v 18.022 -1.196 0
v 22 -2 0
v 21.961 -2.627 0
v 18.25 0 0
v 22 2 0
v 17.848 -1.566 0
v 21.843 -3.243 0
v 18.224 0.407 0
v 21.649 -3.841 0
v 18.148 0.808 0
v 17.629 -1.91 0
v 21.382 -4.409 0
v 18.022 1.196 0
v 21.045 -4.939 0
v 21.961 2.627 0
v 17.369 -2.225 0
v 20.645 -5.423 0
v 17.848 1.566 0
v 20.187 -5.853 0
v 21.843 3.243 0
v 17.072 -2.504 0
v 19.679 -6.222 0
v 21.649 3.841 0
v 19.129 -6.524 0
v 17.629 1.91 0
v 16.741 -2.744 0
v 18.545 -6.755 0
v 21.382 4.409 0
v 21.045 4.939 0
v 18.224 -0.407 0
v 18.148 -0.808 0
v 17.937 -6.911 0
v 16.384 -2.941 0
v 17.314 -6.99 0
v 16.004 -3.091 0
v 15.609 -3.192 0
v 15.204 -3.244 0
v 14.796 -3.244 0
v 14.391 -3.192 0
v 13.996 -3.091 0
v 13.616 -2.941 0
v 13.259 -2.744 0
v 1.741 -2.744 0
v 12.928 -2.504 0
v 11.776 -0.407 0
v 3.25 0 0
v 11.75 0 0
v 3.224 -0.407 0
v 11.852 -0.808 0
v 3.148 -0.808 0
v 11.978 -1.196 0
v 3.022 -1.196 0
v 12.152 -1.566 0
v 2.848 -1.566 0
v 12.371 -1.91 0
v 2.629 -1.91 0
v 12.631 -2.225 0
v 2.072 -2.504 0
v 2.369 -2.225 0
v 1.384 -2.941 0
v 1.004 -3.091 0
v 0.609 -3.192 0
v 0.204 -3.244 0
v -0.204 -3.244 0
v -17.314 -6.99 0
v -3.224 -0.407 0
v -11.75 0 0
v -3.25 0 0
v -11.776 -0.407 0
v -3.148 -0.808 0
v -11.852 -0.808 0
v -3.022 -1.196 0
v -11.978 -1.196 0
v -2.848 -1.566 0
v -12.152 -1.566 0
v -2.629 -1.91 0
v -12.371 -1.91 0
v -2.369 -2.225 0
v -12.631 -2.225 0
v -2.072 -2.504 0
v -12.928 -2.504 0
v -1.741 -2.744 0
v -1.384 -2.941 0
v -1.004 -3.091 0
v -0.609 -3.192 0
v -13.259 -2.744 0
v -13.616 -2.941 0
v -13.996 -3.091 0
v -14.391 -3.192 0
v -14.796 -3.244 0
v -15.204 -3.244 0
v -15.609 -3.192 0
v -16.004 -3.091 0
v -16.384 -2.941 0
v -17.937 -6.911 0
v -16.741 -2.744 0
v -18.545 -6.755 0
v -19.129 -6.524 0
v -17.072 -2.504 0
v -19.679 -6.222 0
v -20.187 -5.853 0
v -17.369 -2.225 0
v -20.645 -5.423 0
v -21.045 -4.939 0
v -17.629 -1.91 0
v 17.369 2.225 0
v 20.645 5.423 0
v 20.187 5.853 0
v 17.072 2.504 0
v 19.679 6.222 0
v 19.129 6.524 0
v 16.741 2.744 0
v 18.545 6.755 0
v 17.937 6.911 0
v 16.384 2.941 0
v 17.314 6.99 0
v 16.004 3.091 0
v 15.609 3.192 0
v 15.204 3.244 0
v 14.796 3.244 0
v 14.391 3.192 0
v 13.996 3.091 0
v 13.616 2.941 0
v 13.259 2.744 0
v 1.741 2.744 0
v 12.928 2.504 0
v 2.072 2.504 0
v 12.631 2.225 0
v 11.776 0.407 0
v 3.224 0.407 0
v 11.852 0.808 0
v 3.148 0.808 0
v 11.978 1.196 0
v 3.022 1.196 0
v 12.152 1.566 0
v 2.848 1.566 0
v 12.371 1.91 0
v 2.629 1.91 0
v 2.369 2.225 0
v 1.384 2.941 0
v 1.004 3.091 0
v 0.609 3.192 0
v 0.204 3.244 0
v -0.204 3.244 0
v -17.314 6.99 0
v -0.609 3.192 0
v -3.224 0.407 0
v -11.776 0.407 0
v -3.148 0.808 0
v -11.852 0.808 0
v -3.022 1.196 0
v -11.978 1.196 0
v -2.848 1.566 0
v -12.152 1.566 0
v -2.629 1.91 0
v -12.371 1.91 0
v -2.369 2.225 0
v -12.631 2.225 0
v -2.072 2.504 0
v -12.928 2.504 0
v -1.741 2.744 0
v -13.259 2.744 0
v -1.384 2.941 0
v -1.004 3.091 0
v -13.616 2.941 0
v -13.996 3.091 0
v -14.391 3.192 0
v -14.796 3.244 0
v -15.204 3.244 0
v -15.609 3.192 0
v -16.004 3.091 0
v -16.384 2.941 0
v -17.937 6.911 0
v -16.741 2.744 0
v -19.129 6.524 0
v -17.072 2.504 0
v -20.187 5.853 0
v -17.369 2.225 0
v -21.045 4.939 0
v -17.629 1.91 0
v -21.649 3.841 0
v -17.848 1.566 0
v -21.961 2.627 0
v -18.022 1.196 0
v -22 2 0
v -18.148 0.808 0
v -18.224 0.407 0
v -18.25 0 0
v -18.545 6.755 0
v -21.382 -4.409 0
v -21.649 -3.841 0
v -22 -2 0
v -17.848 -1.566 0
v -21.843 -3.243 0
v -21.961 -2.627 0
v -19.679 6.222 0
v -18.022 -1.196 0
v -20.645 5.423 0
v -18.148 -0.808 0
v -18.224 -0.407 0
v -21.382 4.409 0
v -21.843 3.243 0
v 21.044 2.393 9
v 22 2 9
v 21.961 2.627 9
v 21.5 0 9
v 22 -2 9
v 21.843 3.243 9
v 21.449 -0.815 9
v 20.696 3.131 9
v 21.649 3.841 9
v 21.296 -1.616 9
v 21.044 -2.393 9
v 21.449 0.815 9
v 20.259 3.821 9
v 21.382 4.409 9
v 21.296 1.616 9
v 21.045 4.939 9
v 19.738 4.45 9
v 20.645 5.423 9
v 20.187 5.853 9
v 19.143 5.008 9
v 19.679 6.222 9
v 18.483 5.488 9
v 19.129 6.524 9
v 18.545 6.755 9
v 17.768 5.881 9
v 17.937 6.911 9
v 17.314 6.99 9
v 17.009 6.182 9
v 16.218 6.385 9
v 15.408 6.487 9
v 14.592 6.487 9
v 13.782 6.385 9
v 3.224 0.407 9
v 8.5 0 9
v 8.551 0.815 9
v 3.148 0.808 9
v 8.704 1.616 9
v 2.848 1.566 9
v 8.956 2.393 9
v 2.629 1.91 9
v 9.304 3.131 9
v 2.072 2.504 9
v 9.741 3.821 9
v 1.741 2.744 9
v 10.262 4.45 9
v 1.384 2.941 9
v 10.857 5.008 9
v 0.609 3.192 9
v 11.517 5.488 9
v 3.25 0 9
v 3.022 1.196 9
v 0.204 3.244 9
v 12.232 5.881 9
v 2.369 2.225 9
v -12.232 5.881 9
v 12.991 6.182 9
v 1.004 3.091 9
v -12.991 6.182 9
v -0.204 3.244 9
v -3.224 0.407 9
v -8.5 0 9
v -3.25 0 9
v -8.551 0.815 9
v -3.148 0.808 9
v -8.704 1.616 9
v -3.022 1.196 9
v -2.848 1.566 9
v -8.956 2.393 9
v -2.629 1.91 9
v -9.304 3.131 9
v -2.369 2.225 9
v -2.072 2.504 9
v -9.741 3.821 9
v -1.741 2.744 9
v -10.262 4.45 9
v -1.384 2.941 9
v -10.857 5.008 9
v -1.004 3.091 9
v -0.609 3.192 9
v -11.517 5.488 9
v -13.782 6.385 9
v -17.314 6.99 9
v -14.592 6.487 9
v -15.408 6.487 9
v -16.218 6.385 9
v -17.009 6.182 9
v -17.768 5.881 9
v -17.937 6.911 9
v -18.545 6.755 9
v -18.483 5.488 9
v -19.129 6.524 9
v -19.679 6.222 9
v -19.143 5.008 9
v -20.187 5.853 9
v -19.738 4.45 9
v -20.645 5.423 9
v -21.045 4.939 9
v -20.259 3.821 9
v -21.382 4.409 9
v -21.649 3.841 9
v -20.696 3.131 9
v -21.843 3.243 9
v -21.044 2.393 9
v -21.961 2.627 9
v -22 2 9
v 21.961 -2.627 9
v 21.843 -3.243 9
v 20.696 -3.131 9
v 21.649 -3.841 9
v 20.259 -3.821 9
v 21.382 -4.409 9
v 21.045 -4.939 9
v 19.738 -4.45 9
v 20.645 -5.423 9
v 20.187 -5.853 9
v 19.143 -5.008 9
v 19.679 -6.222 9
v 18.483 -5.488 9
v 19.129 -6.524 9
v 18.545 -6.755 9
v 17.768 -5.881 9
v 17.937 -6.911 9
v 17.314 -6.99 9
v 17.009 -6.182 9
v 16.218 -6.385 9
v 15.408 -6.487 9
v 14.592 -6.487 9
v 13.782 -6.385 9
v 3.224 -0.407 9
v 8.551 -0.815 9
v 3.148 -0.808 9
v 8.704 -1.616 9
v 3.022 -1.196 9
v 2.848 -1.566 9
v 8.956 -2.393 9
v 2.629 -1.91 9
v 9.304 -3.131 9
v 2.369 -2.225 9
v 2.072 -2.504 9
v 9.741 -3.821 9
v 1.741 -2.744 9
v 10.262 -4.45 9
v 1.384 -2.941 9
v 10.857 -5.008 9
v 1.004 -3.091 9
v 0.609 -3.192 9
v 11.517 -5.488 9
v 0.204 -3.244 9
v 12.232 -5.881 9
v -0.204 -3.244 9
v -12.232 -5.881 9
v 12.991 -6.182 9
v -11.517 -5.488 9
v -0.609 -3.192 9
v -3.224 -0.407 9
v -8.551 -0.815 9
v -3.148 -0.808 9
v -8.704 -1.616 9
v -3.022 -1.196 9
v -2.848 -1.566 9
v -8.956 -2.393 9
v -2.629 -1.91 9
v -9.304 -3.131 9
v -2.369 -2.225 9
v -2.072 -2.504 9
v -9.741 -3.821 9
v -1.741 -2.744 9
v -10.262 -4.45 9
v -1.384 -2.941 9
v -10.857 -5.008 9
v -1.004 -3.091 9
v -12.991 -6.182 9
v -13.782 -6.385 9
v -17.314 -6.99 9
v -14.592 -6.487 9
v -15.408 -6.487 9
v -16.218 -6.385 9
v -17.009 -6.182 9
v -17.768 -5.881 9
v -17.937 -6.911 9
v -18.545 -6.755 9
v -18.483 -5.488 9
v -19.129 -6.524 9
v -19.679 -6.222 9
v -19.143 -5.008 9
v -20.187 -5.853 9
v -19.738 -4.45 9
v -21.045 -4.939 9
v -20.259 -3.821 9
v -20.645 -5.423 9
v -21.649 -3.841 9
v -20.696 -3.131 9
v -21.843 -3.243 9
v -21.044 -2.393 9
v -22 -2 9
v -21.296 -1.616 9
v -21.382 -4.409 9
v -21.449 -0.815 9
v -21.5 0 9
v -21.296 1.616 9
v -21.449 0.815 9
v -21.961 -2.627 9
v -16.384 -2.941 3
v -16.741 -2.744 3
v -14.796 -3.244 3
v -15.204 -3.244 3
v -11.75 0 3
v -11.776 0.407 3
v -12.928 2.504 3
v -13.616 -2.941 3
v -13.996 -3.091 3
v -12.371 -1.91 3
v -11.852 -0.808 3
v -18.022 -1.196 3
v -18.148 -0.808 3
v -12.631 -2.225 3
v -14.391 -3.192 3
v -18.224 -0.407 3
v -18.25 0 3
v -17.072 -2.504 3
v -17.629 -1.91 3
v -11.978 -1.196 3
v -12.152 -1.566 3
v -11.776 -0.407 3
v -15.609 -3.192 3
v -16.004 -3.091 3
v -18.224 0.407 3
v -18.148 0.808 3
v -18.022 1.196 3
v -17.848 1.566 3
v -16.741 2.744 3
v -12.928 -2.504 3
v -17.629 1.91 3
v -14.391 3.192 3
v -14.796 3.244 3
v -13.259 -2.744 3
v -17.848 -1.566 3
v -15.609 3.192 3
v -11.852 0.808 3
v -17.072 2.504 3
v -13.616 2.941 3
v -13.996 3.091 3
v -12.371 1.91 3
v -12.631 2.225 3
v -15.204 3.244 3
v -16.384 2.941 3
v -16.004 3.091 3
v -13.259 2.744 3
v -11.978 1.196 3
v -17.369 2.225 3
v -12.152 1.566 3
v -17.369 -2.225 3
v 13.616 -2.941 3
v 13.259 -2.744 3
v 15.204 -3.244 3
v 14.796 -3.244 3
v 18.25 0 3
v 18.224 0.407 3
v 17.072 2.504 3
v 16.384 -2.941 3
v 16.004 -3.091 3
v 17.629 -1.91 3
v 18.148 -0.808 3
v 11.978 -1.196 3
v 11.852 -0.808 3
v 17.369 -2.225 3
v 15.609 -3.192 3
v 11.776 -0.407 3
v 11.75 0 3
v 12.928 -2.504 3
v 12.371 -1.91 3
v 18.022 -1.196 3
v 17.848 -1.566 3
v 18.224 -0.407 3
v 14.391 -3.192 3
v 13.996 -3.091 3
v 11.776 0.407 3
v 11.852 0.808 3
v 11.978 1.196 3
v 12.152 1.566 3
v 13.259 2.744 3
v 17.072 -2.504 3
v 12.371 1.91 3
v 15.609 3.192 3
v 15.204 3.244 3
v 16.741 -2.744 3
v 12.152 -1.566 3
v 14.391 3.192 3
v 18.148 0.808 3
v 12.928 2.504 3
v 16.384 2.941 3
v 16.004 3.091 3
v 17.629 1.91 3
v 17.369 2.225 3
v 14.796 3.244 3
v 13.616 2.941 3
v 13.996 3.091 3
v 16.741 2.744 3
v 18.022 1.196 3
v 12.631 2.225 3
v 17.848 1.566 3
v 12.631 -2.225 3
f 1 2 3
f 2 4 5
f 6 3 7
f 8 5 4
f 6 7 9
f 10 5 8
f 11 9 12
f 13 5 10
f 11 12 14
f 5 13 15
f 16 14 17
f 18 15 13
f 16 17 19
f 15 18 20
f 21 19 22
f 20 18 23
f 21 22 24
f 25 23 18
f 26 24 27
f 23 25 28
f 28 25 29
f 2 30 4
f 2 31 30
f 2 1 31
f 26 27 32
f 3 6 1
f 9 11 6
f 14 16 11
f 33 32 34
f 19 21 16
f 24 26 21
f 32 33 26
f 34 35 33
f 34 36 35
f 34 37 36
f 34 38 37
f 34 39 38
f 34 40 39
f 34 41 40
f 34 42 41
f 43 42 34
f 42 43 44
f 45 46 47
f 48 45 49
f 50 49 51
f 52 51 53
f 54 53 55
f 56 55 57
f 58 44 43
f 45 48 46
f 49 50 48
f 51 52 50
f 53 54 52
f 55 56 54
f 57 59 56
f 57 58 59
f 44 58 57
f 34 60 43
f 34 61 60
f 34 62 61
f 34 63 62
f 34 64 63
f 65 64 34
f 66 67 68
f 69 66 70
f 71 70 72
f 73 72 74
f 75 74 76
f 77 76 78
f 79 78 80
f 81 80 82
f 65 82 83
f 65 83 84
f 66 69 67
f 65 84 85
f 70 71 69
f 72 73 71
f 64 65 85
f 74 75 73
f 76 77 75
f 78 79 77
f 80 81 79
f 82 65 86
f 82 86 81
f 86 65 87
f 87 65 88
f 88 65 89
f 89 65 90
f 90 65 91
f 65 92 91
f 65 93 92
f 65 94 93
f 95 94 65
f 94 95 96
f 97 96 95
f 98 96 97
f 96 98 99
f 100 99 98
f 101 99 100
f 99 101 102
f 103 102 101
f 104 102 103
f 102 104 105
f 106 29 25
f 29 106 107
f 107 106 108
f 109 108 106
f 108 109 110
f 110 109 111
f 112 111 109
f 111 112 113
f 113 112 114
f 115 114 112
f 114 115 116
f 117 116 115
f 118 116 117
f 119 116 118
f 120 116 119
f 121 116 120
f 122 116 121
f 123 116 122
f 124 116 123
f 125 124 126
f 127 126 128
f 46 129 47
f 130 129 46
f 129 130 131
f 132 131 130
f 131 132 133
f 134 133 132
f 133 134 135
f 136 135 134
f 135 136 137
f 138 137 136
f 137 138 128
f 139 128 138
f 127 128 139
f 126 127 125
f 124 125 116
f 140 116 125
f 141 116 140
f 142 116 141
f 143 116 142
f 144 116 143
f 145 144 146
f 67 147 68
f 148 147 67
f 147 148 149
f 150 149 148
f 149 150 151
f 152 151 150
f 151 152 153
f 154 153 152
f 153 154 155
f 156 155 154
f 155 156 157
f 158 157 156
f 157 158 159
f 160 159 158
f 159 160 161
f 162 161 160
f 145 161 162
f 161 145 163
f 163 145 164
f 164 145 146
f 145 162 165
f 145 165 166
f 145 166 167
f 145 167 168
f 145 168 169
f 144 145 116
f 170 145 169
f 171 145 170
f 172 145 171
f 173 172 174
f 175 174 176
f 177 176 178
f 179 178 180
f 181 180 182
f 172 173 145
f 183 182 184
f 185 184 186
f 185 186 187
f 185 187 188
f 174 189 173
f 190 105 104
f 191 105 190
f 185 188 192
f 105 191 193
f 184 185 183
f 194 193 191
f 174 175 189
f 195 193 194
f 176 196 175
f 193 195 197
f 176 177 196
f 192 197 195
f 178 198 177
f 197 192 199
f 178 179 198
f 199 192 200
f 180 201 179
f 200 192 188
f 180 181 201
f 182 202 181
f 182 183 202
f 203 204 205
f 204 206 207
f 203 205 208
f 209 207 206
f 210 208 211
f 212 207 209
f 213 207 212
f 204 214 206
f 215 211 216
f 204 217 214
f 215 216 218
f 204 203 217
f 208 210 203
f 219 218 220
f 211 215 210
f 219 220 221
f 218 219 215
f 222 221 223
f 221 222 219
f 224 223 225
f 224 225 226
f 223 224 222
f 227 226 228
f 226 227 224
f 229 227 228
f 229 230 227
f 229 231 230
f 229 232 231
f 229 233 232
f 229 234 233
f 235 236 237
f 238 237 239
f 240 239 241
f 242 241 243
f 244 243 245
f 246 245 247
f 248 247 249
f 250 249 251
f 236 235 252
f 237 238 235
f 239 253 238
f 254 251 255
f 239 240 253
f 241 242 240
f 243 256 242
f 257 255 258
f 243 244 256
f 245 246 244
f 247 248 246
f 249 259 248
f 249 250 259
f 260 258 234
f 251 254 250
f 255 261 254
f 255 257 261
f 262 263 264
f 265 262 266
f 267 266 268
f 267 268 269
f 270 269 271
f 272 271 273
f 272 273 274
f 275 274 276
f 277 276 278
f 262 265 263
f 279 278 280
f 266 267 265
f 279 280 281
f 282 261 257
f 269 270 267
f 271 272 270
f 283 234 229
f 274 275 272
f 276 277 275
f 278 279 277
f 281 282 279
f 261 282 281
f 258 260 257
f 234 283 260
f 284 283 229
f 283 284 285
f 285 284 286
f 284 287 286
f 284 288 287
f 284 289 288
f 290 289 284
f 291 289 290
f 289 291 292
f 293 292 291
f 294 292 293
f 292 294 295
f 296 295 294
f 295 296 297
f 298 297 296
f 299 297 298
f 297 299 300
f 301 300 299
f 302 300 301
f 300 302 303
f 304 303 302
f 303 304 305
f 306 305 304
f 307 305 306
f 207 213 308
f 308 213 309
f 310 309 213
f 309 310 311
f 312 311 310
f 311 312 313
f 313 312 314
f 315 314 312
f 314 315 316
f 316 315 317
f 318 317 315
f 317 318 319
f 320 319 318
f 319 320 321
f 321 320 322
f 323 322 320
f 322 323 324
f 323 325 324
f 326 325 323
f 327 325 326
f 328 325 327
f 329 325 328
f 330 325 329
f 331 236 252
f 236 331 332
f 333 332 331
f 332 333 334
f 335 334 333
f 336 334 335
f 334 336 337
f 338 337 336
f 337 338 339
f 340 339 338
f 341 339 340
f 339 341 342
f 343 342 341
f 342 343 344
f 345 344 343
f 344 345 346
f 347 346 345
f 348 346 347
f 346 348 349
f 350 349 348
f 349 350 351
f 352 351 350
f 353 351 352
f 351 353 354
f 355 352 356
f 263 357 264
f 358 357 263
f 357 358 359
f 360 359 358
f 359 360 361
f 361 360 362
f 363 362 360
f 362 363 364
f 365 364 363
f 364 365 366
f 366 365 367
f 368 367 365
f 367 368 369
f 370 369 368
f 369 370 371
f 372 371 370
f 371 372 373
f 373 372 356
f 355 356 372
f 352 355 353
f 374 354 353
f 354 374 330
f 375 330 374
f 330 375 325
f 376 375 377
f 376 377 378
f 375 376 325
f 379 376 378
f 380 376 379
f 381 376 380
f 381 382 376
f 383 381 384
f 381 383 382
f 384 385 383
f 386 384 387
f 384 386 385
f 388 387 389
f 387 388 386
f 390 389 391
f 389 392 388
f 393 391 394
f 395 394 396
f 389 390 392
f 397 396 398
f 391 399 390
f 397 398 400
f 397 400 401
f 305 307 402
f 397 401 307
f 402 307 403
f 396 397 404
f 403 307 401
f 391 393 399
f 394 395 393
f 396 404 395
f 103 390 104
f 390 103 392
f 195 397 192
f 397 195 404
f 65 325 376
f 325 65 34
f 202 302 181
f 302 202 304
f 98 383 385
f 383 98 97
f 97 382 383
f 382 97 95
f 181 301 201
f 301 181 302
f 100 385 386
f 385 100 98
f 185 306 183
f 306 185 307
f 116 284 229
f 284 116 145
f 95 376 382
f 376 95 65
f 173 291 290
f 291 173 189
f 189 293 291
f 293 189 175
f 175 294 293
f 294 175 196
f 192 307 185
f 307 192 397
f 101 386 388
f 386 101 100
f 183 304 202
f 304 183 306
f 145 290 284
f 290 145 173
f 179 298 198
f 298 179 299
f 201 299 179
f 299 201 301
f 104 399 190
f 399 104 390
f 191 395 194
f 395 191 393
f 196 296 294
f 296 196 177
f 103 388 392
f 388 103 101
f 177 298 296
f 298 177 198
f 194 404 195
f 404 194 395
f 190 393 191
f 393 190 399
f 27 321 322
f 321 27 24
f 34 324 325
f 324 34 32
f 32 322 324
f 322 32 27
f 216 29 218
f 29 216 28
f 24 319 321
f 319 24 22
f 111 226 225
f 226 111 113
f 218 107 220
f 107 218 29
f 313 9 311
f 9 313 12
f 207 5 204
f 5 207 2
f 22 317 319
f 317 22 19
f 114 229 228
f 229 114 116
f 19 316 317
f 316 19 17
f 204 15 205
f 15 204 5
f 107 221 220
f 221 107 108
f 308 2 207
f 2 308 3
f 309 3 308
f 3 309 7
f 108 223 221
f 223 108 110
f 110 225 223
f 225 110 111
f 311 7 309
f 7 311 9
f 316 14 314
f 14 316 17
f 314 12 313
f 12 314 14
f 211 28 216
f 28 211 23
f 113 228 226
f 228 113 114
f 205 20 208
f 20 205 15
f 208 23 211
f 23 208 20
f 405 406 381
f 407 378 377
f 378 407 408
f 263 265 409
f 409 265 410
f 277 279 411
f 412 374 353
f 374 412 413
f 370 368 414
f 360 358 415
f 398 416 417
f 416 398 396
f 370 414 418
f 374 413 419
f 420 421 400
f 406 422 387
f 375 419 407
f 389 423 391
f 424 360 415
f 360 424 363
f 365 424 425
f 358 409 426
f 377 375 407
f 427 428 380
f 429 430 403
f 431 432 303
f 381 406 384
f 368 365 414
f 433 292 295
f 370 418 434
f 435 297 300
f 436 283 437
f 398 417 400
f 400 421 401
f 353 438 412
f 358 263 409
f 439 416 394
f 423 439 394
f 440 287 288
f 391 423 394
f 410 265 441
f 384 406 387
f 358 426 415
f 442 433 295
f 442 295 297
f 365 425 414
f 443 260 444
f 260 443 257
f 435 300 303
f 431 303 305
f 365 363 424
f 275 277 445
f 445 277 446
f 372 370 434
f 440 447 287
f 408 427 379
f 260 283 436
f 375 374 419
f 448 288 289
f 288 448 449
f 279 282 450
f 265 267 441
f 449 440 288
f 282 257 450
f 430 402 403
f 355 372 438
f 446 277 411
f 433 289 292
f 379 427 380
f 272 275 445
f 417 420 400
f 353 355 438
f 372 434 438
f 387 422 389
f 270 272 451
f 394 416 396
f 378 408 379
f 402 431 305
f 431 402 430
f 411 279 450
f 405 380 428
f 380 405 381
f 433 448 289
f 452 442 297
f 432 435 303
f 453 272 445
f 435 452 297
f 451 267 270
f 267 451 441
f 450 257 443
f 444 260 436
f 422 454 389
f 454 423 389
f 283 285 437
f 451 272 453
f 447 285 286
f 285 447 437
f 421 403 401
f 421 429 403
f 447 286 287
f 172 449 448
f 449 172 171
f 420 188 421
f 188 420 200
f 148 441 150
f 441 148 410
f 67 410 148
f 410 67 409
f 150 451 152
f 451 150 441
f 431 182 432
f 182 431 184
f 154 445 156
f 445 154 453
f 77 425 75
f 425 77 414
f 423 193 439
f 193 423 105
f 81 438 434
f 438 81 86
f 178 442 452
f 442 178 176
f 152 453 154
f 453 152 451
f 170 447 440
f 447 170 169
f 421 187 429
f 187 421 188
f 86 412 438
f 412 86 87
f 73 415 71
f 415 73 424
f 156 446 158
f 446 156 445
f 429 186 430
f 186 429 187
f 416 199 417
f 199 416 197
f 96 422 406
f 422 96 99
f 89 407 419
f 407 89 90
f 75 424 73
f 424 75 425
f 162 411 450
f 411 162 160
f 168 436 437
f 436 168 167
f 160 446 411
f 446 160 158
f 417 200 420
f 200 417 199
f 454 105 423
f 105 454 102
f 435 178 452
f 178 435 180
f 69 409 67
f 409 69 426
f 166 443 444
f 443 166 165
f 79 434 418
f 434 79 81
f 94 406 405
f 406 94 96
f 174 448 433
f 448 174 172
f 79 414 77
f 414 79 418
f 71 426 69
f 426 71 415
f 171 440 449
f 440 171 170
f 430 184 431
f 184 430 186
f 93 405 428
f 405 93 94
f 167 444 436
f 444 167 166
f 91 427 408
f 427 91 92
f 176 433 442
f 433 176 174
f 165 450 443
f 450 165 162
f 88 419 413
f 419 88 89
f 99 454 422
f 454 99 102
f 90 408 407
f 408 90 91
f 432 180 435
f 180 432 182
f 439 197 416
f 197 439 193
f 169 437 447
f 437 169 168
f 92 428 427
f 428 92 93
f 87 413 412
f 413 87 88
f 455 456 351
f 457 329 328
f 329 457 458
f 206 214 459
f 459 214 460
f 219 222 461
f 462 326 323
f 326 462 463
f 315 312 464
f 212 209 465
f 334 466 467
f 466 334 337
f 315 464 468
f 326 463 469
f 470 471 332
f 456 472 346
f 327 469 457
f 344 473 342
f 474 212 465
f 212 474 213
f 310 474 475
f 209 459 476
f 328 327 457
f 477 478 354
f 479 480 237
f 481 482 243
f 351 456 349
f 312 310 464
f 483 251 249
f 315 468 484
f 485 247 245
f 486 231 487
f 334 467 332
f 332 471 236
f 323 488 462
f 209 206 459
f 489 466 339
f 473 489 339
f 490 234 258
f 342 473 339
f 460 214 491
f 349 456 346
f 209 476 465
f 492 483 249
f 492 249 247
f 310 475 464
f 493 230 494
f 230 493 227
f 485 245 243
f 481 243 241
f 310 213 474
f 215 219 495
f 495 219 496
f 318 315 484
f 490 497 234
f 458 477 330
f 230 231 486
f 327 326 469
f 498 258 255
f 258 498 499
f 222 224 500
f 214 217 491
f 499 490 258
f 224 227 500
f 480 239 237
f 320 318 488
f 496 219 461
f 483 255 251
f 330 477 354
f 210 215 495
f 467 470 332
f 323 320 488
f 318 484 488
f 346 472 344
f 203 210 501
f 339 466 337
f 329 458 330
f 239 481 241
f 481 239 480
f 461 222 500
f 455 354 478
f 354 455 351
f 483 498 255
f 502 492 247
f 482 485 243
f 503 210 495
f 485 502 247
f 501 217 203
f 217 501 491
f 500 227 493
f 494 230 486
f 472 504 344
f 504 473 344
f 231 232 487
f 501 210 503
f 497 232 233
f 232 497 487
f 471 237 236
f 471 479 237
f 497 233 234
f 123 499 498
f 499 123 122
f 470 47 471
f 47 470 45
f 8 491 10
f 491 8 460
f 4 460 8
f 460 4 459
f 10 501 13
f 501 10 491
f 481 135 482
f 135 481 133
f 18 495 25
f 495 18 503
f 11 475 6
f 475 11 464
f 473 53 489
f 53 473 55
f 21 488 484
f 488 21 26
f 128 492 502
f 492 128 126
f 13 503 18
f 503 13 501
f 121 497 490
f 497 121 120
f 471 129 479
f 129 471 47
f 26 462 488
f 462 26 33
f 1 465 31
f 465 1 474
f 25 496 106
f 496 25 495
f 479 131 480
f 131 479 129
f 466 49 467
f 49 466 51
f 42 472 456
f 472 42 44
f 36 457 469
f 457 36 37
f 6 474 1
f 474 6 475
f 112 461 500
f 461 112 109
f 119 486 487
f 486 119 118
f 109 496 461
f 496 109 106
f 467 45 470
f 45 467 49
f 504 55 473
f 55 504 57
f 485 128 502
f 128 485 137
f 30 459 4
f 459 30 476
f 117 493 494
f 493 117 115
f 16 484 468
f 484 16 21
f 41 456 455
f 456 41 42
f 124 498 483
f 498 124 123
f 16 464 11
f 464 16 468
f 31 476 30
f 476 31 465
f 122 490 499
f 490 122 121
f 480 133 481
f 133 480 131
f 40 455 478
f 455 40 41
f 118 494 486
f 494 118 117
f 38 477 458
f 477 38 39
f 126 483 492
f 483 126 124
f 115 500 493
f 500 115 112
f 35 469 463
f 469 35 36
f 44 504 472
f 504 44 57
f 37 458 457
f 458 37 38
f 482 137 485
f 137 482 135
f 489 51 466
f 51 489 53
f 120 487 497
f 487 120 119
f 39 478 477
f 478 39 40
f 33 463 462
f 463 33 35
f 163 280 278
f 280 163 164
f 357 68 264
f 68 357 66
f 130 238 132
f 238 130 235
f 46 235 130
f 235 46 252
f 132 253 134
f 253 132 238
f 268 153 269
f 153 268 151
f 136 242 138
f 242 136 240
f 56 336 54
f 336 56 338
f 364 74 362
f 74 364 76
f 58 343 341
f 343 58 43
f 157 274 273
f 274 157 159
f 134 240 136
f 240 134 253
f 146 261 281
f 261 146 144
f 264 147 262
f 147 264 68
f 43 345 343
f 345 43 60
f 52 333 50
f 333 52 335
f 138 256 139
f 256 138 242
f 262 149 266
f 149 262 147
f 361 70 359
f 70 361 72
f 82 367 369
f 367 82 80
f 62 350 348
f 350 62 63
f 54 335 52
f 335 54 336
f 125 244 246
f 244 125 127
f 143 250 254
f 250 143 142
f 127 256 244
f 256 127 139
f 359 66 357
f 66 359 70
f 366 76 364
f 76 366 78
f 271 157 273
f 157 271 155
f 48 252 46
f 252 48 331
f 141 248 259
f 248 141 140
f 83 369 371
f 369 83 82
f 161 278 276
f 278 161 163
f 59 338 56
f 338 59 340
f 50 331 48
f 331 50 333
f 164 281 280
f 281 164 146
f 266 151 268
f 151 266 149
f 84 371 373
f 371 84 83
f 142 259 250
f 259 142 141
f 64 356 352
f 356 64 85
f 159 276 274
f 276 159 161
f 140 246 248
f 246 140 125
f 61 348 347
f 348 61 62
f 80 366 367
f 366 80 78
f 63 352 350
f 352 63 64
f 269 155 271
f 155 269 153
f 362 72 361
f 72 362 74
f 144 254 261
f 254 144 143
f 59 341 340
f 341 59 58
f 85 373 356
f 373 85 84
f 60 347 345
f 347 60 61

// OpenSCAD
$fn = 50;


difference() {
	union() {
		cylinder(h = 9, r = 7.0000000000);
		translate(v = [-7.5000000000, 0.0000000000, 0]) {
			hull() {
				translate(v = [-9.5000000000, 2.0000000000, 0]) {
					cylinder(h = 9, r = 5);
				}
				translate(v = [9.5000000000, 2.0000000000, 0]) {
					cylinder(h = 9, r = 5);
				}
				translate(v = [-9.5000000000, -2.0000000000, 0]) {
					cylinder(h = 9, r = 5);
				}
				translate(v = [9.5000000000, -2.0000000000, 0]) {
					cylinder(h = 9, r = 5);
				}
			}
		}
		translate(v = [-7.5000000000, 0.0000000000, 0]) {
			hull() {
				translate(v = [-9.5000000000, 2.0000000000, 0]) {
					cylinder(h = 9, r = 5);
				}
				translate(v = [9.5000000000, 2.0000000000, 0]) {
					cylinder(h = 9, r = 5);
				}
				translate(v = [-9.5000000000, -2.0000000000, 0]) {
					cylinder(h = 9, r = 5);
				}
				translate(v = [9.5000000000, -2.0000000000, 0]) {
					cylinder(h = 9, r = 5);
				}
			}
		}
		translate(v = [7.5000000000, 0.0000000000, 0]) {
			hull() {
				translate(v = [-9.5000000000, 2.0000000000, 0]) {
					cylinder(h = 9, r = 5);
				}
				translate(v = [9.5000000000, 2.0000000000, 0]) {
					cylinder(h = 9, r = 5);
				}
				translate(v = [-9.5000000000, -2.0000000000, 0]) {
					cylinder(h = 9, r = 5);
				}
				translate(v = [9.5000000000, -2.0000000000, 0]) {
					cylinder(h = 9, r = 5);
				}
			}
		}
		translate(v = [7.5000000000, 0.0000000000, 0]) {
			hull() {
				translate(v = [-9.5000000000, 2.0000000000, 0]) {
					cylinder(h = 9, r = 5);
				}
				translate(v = [9.5000000000, 2.0000000000, 0]) {
					cylinder(h = 9, r = 5);
				}
				translate(v = [-9.5000000000, -2.0000000000, 0]) {
					cylinder(h = 9, r = 5);
				}
				translate(v = [9.5000000000, -2.0000000000, 0]) {
					cylinder(h = 9, r = 5);
				}
			}
		}
	}
	union() {
		translate(v = [-15.0000000000, 0.0000000000, 9]) {
			rotate(a = [0, 0, 0]) {
				difference() {
					union() {
						#translate(v = [0, 0, -9.0000000000]) {
							cylinder(h = 9, r = 2.2500000000);
						}
						#translate(v = [0, 0, -6]) {
							cylinder(h = 6, r1 = 3.2500000000, r2 = 6.5000000000);
						}
						#translate(v = [0, 0, -9.0000000000]) {
							cylinder(h = 9, r = 3.2500000000);
						}
						#translate(v = [0, 0, -9.0000000000]) {
							cylinder(h = 9, r = 2.2500000000);
						}
					}
					union();
				}
			}
		}
		translate(v = [-15.0000000000, 0.0000000000, 9]) {
			rotate(a = [0, 0, 0]) {
				difference() {
					union() {
						#translate(v = [0, 0, -9.0000000000]) {
							cylinder(h = 9, r = 2.2500000000);
						}
						#translate(v = [0, 0, -6]) {
							cylinder(h = 6, r1 = 3.2500000000, r2 = 6.5000000000);
						}
						#translate(v = [0, 0, -9.0000000000]) {
							cylinder(h = 9, r = 3.2500000000);
						}
						#translate(v = [0, 0, -9.0000000000]) {
							cylinder(h = 9, r = 2.2500000000);
						}
					}
					union();
				}
			}
		}
		translate(v = [15.0000000000, 0.0000000000, 9]) {
			rotate(a = [0, 0, 0]) {
				difference() {
					union() {
						#translate(v = [0, 0, -9.0000000000]) {
							cylinder(h = 9, r = 2.2500000000);
						}
						#translate(v = [0, 0, -6]) {
							cylinder(h = 6, r1 = 3.2500000000, r2 = 6.5000000000);
						}
						#translate(v = [0, 0, -9.0000000000]) {
							cylinder(h = 9, r = 3.2500000000);
						}
						#translate(v = [0, 0, -9.0000000000]) {
							cylinder(h = 9, r = 2.2500000000);
						}
					}
					union();
				}
			}
		}
		translate(v = [15.0000000000, 0.0000000000, 9]) {
			rotate(a = [0, 0, 0]) {
				difference() {
					union() {
						#translate(v = [0, 0, -9.0000000000]) {
							cylinder(h = 9, r = 2.2500000000);
						}
						#translate(v = [0, 0, -6]) {
							cylinder(h = 6, r1 = 3.2500000000, r2 = 6.5000000000);
						}
						#translate(v = [0, 0, -9.0000000000]) {
							cylinder(h = 9, r = 3.2500000000);
						}
						#translate(v = [0, 0, -9.0000000000]) {
							cylinder(h = 9, r = 2.2500000000);
						}
					}
					union();
				}
			}
		}
		translate(v = [0, 0, -100]) {
			cylinder(h = 200, r = 3.2500000000);
		}
		translate(v = [0, 0, -100]) {
			cylinder(h = 200, r = 1.8000000000);
		}
	}
}
